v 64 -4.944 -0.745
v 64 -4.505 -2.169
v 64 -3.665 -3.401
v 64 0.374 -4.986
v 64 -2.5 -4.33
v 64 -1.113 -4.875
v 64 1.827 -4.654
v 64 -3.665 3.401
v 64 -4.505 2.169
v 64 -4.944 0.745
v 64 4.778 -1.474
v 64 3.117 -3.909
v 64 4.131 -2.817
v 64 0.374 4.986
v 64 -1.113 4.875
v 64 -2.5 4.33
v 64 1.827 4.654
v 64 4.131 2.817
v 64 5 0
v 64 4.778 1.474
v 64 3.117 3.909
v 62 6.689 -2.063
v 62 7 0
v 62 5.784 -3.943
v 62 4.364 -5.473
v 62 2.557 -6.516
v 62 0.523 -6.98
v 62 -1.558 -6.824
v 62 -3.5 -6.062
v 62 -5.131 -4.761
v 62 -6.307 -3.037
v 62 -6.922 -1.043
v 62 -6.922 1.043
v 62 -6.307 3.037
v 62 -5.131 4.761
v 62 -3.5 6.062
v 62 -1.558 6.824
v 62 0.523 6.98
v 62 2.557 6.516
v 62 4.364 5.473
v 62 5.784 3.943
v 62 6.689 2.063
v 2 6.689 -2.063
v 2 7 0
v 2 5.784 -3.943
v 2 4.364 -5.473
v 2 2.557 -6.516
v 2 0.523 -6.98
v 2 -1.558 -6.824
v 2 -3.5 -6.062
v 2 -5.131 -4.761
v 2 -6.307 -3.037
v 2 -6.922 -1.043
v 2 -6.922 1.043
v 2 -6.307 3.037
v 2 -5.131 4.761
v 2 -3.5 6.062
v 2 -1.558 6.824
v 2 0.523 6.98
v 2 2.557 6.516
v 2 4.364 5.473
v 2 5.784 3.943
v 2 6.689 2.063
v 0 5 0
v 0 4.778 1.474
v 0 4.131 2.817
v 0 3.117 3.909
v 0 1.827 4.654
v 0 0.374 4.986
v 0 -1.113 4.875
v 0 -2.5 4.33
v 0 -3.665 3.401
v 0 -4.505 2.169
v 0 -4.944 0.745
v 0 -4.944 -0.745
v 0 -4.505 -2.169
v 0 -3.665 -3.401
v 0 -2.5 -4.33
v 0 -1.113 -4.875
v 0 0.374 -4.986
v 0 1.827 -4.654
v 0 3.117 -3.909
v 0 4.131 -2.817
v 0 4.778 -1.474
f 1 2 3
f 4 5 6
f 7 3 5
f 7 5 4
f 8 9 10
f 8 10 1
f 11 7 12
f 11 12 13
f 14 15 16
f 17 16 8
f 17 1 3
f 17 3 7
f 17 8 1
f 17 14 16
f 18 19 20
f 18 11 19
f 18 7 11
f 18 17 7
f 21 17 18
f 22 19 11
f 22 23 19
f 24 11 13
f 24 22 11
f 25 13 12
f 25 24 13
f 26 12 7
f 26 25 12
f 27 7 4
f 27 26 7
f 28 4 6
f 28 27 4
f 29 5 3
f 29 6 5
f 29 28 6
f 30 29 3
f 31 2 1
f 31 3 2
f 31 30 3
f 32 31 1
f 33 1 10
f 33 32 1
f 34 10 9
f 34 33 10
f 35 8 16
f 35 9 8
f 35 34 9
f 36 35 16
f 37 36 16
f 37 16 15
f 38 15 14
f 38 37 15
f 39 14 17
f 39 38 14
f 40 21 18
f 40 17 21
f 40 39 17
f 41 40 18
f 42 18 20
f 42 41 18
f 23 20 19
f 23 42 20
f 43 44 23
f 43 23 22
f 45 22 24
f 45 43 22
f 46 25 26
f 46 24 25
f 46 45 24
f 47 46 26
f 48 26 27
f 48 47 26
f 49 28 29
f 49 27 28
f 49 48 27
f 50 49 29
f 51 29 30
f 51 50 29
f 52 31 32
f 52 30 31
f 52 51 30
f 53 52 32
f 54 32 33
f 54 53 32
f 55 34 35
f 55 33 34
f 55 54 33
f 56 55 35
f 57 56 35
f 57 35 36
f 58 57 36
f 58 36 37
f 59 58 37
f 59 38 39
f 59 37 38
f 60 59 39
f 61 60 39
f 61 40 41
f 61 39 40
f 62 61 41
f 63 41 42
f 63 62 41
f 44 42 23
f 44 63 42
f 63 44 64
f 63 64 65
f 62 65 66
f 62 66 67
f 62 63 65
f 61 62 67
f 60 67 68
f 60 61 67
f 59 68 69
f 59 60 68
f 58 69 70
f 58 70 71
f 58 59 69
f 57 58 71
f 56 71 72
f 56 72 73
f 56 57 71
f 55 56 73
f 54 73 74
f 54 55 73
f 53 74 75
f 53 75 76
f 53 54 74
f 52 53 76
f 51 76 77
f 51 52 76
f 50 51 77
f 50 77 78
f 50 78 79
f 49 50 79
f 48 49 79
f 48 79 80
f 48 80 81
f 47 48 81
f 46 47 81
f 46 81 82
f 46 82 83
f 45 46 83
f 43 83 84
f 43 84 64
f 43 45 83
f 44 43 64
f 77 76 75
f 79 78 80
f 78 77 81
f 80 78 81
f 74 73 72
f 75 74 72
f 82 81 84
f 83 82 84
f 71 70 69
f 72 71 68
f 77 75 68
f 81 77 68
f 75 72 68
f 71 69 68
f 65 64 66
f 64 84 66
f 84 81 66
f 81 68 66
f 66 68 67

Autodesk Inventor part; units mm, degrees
ref_plane "YZ Plane" through (0, 0, 0) normal (1, 0, 0) x (0, 1, 0)
ref_plane "XZ Plane" through (0, 0, 0) normal (0, 1, 0) x (-1, 0, 0)
ref_plane "XY Plane" through (0, 0, 0) normal (0, 0, 1) x (1, 0, 0)
sketch "Sketch1" plane through (0, 0, 0) normal (1, 0, 0) x (0, 1, 0)
  circle A0 centre (0, 0) radius 7
  dimension "d0" = 14
extrude "Extrusion1" add sketch "Sketch1" along normal blind 64
chamfer "Chamfer1" distance 2 angle 45 1 edges at (64, -7, 0) measured on face at (64, -0.8274, 0.9129)
chamfer "Chamfer2" distance 2 angle 45 1 edges at (0, -7, 0) measured on face at (0, -0.8274, 0.9129)
properties part number "Stub" material "Steel, Carbon"
